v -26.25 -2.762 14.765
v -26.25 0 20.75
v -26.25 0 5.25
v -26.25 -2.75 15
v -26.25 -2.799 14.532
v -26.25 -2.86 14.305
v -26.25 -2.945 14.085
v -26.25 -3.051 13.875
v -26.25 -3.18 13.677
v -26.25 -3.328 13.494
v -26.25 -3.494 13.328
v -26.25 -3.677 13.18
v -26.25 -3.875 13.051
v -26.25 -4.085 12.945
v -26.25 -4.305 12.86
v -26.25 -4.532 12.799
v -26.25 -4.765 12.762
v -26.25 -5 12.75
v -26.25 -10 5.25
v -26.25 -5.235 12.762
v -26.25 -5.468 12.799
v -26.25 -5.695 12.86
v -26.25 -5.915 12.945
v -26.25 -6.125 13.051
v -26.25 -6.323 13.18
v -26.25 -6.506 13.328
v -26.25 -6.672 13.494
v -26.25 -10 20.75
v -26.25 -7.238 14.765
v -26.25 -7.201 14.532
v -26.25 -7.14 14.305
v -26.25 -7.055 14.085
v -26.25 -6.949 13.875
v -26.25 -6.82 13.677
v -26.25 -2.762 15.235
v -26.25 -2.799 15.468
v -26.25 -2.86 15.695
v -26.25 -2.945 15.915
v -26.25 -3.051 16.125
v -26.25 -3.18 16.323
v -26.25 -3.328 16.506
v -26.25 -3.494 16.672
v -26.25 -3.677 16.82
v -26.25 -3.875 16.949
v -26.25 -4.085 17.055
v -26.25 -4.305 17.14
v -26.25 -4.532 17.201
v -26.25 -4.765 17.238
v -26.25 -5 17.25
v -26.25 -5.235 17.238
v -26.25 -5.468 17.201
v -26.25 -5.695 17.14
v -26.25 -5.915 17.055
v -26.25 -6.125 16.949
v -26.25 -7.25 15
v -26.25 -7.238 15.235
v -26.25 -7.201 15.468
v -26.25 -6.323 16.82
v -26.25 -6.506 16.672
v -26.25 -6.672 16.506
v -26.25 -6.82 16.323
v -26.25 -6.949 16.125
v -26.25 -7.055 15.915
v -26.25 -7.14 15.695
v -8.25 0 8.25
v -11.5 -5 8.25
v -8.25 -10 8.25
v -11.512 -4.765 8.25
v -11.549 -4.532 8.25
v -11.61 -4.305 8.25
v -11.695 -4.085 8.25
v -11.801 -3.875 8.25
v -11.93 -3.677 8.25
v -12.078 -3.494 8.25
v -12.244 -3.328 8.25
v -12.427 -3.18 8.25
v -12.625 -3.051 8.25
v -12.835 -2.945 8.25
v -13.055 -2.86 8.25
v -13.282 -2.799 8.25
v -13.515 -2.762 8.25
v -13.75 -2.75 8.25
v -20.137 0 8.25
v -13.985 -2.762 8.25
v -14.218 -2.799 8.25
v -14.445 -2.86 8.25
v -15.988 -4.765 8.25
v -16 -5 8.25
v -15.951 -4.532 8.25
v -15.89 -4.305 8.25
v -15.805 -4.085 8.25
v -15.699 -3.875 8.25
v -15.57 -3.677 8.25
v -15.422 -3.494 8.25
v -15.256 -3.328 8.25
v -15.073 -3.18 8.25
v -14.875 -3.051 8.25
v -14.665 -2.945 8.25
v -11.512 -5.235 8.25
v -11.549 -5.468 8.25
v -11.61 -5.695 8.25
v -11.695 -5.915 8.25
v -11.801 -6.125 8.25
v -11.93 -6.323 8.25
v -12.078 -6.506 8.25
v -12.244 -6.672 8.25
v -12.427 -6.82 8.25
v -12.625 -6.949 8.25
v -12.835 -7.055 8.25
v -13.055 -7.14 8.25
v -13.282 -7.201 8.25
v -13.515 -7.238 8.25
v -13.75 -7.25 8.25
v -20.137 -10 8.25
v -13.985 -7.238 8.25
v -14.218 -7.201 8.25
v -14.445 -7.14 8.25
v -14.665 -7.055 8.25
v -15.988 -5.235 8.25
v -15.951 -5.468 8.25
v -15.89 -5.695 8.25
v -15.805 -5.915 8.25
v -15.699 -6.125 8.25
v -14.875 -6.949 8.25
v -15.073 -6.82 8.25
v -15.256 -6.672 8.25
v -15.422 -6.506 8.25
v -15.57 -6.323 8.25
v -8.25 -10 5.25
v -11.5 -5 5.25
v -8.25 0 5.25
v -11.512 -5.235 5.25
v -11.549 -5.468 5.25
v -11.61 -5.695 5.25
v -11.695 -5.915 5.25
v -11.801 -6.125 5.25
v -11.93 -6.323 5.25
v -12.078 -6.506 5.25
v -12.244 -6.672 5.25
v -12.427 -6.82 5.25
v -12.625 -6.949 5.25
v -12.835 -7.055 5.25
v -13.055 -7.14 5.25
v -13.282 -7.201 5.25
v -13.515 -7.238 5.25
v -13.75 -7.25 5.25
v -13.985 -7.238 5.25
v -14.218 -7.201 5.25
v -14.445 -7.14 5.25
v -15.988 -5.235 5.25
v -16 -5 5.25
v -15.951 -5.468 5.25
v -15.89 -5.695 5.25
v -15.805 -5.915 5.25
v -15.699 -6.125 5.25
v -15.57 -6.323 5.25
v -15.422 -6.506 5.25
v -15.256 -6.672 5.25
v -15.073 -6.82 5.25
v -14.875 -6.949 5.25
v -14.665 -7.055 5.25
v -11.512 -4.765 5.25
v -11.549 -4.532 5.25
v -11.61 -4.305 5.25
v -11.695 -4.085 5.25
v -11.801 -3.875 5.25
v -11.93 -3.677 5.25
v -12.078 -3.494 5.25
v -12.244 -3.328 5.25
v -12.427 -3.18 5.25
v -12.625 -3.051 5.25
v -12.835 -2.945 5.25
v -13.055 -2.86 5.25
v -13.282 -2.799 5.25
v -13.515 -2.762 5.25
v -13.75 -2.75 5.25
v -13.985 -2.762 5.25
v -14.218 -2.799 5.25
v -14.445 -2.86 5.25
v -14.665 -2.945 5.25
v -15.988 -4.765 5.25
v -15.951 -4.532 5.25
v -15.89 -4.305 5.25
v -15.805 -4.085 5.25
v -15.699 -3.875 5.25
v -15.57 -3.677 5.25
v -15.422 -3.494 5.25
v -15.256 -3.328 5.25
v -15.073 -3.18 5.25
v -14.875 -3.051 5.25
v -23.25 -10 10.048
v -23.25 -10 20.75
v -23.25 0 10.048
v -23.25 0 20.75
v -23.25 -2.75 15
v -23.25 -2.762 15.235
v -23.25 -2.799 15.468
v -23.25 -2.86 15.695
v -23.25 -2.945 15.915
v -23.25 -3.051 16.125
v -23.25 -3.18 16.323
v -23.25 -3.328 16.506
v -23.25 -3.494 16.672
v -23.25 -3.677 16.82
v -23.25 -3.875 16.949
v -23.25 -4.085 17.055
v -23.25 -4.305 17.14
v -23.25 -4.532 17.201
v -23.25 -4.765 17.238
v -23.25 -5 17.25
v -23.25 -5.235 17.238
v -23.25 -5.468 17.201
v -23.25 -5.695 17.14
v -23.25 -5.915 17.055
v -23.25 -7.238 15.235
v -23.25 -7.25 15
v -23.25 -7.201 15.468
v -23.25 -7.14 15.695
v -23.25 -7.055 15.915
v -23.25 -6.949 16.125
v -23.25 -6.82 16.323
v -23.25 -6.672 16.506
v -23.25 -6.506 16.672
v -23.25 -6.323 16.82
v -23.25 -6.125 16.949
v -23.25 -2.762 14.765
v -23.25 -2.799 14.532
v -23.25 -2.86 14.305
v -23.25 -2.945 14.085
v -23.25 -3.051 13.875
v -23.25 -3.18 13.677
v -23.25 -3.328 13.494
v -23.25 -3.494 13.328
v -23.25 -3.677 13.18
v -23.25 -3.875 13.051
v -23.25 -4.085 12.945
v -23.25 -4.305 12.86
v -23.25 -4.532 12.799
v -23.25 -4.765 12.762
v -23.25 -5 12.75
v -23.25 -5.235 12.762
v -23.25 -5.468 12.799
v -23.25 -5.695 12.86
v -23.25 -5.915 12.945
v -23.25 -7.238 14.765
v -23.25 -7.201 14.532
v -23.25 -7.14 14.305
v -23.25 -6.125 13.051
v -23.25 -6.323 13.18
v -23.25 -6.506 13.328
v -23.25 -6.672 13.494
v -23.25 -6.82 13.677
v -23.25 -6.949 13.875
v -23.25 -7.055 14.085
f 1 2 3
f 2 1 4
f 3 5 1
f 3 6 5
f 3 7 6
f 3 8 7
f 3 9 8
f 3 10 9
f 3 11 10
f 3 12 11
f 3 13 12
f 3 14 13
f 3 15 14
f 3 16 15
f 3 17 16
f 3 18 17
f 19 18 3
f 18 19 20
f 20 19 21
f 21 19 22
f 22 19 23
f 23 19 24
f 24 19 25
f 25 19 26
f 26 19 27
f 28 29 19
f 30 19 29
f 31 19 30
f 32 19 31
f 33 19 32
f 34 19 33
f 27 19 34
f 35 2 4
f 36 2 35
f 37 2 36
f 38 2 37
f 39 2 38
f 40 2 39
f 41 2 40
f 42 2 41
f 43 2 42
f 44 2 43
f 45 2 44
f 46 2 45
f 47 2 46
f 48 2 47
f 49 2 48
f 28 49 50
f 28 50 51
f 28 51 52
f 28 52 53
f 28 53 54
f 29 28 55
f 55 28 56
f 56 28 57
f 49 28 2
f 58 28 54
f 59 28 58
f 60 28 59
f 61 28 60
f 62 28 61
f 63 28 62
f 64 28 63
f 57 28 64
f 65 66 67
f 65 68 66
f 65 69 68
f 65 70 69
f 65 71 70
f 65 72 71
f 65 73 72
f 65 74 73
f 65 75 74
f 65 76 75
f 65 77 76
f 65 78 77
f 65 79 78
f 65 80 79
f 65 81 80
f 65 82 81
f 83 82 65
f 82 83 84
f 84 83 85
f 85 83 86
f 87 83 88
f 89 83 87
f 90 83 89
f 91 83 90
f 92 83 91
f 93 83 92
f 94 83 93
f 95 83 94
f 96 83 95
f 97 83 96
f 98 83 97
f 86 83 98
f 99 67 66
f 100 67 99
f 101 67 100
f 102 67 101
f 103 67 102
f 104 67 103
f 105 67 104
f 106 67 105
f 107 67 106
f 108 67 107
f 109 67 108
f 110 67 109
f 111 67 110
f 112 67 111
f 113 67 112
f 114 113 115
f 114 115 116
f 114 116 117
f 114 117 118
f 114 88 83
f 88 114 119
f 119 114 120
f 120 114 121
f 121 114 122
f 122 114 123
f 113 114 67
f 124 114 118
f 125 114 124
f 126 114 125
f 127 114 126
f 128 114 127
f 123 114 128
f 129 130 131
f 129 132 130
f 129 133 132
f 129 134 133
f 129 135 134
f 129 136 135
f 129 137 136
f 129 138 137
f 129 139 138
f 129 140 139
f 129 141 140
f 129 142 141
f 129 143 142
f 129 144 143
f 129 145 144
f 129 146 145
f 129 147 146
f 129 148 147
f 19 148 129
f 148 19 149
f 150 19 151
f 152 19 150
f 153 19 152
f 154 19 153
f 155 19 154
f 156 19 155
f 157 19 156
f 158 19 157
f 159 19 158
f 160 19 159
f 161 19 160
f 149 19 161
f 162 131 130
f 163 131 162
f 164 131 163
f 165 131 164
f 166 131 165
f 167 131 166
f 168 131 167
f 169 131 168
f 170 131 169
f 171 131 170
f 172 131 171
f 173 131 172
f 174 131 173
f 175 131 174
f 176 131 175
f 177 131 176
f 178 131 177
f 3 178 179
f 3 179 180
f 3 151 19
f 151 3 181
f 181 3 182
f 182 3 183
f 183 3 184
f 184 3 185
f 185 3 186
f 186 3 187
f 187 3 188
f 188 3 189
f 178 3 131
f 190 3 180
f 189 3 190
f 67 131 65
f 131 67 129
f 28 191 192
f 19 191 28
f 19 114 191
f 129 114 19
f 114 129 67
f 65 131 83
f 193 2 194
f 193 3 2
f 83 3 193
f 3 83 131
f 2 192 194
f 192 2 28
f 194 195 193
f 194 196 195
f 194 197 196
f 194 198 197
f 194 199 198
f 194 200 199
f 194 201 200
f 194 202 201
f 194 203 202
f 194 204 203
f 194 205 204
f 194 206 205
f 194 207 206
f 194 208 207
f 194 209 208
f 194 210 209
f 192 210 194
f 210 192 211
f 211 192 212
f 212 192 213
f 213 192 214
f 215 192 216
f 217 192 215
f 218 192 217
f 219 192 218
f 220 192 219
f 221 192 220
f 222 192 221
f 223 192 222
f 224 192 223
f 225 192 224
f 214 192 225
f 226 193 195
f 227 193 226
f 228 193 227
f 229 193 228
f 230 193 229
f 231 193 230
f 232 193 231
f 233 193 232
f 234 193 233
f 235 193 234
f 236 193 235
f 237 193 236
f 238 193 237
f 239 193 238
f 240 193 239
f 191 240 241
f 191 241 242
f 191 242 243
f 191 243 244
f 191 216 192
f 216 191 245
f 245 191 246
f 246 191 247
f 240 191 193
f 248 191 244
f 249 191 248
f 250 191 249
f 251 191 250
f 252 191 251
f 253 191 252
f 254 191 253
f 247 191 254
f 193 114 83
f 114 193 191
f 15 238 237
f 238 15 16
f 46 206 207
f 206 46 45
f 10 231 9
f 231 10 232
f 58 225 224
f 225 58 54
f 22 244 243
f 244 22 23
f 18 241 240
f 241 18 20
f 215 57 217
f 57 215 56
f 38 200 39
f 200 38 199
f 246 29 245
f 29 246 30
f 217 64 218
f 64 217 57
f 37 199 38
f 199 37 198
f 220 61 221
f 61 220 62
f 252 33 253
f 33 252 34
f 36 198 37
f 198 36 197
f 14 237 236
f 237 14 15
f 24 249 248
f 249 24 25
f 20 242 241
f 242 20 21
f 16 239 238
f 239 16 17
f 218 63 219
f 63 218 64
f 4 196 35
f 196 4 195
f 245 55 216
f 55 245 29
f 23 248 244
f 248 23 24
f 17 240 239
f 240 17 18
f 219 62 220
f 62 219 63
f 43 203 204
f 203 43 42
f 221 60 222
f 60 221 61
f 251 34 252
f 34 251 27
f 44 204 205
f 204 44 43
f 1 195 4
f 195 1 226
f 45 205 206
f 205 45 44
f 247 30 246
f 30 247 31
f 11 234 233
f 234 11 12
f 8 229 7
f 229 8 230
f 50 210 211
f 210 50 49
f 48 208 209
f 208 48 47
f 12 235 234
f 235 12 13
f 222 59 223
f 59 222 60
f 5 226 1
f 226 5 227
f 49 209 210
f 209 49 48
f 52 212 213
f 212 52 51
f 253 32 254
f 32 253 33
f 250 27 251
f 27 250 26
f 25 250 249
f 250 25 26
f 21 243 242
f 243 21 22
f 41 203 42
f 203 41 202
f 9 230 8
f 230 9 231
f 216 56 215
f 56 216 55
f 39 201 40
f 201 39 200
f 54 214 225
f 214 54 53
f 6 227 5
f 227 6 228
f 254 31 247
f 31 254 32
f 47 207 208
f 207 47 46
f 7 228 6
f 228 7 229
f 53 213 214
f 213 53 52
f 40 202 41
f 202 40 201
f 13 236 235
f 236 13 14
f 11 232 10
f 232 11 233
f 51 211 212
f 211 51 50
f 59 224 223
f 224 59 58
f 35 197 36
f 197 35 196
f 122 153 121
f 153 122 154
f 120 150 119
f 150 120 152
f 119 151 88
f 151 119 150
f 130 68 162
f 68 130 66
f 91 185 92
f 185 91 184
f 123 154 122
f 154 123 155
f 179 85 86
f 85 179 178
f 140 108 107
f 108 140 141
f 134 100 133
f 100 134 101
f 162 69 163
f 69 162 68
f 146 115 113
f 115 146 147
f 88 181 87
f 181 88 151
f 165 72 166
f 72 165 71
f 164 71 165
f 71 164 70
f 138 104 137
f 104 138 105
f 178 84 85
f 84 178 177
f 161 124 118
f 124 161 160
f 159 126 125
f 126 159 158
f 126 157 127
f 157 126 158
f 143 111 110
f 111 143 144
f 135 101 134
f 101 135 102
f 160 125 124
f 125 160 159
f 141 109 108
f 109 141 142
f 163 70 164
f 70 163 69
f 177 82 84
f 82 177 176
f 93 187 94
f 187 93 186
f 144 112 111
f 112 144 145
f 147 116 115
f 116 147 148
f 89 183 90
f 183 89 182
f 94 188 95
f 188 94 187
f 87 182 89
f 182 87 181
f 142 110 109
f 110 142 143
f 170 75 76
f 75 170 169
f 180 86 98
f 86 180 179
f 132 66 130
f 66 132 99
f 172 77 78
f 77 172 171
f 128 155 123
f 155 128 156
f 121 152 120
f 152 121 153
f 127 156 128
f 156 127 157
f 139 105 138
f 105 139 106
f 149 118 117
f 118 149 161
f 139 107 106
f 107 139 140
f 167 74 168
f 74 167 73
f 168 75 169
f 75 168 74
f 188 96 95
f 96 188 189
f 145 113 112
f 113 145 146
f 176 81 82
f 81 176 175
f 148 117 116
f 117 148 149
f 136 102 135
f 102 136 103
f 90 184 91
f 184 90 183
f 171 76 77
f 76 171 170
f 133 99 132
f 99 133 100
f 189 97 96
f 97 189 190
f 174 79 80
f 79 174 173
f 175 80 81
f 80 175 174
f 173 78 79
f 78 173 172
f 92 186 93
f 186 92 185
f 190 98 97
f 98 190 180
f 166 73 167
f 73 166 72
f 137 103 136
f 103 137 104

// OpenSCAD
// file: Clip.scad
// Puzzlebox Bloom
//
// component: Clip
//
// by Puzzlebox Productions, LLC
// http://puzzlebox.io/bloom
//
// Copyright Puzzlebox Productions, LLC (2014)
//
// License: Creative Commons - Attribution - Share Alike
//          https://creativecommons.org/licenses/by-sa/3.0


// Modules

module assemble_clip() {
	
	lid_mount_clip();
	
}


module lid_mount_clip(){
	
	
	translate([lid_mount_bolt_spacer,0,lid_mount_bolt_spacer])
	
	translate([-10,-5,4])
	rotate([0,0,180])
	
	difference(){
		
		union(){
			
			// horizontal
			translate([11,0,-1])
			cube([18,10,3],center=true);
			
			
			// vertical
			translate([18.5,0,5+1+2-1.25])
			cube([3,10,15-2.5],center=true);
			
			// diagonal reinforcement
			translate([16.8,0,0.45])
			rotate([0,60,0])
			cube([3,10,5],center=true);
			
			
			// 			translate([10,0,0])
			// 			cylinder(h=10, d=lid_mount_screw_diameter, center=true);
			
		}
		
		// vertical
		translate([18.5,0,10+1-lid_mount_bolt_spacer])
		rotate([0,90,0])
		cylinder(h=10, d=lid_mount_screw_diameter, center=true);
		
		
		// horizontal
		translate([7.5,0,0])
		cylinder(h=10, d=lid_mount_screw_diameter, center=true);
		
		
		
	}
	
	
}


module lid_mount_alignment_screw(){
	
	translate([-15,0,-10])
	
	translate([lid_mount_bolt_spacer,0,lid_mount_bolt_spacer])
	translate([-10,-5,4])
	translate([7.5,0,0])
	cylinder(h=25, d=lid_mount_screw_diameter, center=true);
	
	
}
// main file
//
// Puzzlebox Bloom
//
// component: Clip
//
// edition: Drafting
//
// by Puzzlebox Productions, LLC
// http://puzzlebox.io/bloom
//
// Copyright Puzzlebox Productions, LLC (2014)
//
// License: Creative Commons - Attribution - Share Alike
//          https://creativecommons.org/licenses/by-sa/3.0


// Libraries
include <../Configuration.scad>
// include <../bottom/Bottom.scad>
include <../clip/Clip.scad>


// Configuration
// build_base_socket=false;
build_base_socket=true;
build_inner_support_walls=false;


// Rendering quality (calculated via angle in degrees)
$fa=6;
$fn=60;
//$fs=1;


// Main
assemble_clip();
